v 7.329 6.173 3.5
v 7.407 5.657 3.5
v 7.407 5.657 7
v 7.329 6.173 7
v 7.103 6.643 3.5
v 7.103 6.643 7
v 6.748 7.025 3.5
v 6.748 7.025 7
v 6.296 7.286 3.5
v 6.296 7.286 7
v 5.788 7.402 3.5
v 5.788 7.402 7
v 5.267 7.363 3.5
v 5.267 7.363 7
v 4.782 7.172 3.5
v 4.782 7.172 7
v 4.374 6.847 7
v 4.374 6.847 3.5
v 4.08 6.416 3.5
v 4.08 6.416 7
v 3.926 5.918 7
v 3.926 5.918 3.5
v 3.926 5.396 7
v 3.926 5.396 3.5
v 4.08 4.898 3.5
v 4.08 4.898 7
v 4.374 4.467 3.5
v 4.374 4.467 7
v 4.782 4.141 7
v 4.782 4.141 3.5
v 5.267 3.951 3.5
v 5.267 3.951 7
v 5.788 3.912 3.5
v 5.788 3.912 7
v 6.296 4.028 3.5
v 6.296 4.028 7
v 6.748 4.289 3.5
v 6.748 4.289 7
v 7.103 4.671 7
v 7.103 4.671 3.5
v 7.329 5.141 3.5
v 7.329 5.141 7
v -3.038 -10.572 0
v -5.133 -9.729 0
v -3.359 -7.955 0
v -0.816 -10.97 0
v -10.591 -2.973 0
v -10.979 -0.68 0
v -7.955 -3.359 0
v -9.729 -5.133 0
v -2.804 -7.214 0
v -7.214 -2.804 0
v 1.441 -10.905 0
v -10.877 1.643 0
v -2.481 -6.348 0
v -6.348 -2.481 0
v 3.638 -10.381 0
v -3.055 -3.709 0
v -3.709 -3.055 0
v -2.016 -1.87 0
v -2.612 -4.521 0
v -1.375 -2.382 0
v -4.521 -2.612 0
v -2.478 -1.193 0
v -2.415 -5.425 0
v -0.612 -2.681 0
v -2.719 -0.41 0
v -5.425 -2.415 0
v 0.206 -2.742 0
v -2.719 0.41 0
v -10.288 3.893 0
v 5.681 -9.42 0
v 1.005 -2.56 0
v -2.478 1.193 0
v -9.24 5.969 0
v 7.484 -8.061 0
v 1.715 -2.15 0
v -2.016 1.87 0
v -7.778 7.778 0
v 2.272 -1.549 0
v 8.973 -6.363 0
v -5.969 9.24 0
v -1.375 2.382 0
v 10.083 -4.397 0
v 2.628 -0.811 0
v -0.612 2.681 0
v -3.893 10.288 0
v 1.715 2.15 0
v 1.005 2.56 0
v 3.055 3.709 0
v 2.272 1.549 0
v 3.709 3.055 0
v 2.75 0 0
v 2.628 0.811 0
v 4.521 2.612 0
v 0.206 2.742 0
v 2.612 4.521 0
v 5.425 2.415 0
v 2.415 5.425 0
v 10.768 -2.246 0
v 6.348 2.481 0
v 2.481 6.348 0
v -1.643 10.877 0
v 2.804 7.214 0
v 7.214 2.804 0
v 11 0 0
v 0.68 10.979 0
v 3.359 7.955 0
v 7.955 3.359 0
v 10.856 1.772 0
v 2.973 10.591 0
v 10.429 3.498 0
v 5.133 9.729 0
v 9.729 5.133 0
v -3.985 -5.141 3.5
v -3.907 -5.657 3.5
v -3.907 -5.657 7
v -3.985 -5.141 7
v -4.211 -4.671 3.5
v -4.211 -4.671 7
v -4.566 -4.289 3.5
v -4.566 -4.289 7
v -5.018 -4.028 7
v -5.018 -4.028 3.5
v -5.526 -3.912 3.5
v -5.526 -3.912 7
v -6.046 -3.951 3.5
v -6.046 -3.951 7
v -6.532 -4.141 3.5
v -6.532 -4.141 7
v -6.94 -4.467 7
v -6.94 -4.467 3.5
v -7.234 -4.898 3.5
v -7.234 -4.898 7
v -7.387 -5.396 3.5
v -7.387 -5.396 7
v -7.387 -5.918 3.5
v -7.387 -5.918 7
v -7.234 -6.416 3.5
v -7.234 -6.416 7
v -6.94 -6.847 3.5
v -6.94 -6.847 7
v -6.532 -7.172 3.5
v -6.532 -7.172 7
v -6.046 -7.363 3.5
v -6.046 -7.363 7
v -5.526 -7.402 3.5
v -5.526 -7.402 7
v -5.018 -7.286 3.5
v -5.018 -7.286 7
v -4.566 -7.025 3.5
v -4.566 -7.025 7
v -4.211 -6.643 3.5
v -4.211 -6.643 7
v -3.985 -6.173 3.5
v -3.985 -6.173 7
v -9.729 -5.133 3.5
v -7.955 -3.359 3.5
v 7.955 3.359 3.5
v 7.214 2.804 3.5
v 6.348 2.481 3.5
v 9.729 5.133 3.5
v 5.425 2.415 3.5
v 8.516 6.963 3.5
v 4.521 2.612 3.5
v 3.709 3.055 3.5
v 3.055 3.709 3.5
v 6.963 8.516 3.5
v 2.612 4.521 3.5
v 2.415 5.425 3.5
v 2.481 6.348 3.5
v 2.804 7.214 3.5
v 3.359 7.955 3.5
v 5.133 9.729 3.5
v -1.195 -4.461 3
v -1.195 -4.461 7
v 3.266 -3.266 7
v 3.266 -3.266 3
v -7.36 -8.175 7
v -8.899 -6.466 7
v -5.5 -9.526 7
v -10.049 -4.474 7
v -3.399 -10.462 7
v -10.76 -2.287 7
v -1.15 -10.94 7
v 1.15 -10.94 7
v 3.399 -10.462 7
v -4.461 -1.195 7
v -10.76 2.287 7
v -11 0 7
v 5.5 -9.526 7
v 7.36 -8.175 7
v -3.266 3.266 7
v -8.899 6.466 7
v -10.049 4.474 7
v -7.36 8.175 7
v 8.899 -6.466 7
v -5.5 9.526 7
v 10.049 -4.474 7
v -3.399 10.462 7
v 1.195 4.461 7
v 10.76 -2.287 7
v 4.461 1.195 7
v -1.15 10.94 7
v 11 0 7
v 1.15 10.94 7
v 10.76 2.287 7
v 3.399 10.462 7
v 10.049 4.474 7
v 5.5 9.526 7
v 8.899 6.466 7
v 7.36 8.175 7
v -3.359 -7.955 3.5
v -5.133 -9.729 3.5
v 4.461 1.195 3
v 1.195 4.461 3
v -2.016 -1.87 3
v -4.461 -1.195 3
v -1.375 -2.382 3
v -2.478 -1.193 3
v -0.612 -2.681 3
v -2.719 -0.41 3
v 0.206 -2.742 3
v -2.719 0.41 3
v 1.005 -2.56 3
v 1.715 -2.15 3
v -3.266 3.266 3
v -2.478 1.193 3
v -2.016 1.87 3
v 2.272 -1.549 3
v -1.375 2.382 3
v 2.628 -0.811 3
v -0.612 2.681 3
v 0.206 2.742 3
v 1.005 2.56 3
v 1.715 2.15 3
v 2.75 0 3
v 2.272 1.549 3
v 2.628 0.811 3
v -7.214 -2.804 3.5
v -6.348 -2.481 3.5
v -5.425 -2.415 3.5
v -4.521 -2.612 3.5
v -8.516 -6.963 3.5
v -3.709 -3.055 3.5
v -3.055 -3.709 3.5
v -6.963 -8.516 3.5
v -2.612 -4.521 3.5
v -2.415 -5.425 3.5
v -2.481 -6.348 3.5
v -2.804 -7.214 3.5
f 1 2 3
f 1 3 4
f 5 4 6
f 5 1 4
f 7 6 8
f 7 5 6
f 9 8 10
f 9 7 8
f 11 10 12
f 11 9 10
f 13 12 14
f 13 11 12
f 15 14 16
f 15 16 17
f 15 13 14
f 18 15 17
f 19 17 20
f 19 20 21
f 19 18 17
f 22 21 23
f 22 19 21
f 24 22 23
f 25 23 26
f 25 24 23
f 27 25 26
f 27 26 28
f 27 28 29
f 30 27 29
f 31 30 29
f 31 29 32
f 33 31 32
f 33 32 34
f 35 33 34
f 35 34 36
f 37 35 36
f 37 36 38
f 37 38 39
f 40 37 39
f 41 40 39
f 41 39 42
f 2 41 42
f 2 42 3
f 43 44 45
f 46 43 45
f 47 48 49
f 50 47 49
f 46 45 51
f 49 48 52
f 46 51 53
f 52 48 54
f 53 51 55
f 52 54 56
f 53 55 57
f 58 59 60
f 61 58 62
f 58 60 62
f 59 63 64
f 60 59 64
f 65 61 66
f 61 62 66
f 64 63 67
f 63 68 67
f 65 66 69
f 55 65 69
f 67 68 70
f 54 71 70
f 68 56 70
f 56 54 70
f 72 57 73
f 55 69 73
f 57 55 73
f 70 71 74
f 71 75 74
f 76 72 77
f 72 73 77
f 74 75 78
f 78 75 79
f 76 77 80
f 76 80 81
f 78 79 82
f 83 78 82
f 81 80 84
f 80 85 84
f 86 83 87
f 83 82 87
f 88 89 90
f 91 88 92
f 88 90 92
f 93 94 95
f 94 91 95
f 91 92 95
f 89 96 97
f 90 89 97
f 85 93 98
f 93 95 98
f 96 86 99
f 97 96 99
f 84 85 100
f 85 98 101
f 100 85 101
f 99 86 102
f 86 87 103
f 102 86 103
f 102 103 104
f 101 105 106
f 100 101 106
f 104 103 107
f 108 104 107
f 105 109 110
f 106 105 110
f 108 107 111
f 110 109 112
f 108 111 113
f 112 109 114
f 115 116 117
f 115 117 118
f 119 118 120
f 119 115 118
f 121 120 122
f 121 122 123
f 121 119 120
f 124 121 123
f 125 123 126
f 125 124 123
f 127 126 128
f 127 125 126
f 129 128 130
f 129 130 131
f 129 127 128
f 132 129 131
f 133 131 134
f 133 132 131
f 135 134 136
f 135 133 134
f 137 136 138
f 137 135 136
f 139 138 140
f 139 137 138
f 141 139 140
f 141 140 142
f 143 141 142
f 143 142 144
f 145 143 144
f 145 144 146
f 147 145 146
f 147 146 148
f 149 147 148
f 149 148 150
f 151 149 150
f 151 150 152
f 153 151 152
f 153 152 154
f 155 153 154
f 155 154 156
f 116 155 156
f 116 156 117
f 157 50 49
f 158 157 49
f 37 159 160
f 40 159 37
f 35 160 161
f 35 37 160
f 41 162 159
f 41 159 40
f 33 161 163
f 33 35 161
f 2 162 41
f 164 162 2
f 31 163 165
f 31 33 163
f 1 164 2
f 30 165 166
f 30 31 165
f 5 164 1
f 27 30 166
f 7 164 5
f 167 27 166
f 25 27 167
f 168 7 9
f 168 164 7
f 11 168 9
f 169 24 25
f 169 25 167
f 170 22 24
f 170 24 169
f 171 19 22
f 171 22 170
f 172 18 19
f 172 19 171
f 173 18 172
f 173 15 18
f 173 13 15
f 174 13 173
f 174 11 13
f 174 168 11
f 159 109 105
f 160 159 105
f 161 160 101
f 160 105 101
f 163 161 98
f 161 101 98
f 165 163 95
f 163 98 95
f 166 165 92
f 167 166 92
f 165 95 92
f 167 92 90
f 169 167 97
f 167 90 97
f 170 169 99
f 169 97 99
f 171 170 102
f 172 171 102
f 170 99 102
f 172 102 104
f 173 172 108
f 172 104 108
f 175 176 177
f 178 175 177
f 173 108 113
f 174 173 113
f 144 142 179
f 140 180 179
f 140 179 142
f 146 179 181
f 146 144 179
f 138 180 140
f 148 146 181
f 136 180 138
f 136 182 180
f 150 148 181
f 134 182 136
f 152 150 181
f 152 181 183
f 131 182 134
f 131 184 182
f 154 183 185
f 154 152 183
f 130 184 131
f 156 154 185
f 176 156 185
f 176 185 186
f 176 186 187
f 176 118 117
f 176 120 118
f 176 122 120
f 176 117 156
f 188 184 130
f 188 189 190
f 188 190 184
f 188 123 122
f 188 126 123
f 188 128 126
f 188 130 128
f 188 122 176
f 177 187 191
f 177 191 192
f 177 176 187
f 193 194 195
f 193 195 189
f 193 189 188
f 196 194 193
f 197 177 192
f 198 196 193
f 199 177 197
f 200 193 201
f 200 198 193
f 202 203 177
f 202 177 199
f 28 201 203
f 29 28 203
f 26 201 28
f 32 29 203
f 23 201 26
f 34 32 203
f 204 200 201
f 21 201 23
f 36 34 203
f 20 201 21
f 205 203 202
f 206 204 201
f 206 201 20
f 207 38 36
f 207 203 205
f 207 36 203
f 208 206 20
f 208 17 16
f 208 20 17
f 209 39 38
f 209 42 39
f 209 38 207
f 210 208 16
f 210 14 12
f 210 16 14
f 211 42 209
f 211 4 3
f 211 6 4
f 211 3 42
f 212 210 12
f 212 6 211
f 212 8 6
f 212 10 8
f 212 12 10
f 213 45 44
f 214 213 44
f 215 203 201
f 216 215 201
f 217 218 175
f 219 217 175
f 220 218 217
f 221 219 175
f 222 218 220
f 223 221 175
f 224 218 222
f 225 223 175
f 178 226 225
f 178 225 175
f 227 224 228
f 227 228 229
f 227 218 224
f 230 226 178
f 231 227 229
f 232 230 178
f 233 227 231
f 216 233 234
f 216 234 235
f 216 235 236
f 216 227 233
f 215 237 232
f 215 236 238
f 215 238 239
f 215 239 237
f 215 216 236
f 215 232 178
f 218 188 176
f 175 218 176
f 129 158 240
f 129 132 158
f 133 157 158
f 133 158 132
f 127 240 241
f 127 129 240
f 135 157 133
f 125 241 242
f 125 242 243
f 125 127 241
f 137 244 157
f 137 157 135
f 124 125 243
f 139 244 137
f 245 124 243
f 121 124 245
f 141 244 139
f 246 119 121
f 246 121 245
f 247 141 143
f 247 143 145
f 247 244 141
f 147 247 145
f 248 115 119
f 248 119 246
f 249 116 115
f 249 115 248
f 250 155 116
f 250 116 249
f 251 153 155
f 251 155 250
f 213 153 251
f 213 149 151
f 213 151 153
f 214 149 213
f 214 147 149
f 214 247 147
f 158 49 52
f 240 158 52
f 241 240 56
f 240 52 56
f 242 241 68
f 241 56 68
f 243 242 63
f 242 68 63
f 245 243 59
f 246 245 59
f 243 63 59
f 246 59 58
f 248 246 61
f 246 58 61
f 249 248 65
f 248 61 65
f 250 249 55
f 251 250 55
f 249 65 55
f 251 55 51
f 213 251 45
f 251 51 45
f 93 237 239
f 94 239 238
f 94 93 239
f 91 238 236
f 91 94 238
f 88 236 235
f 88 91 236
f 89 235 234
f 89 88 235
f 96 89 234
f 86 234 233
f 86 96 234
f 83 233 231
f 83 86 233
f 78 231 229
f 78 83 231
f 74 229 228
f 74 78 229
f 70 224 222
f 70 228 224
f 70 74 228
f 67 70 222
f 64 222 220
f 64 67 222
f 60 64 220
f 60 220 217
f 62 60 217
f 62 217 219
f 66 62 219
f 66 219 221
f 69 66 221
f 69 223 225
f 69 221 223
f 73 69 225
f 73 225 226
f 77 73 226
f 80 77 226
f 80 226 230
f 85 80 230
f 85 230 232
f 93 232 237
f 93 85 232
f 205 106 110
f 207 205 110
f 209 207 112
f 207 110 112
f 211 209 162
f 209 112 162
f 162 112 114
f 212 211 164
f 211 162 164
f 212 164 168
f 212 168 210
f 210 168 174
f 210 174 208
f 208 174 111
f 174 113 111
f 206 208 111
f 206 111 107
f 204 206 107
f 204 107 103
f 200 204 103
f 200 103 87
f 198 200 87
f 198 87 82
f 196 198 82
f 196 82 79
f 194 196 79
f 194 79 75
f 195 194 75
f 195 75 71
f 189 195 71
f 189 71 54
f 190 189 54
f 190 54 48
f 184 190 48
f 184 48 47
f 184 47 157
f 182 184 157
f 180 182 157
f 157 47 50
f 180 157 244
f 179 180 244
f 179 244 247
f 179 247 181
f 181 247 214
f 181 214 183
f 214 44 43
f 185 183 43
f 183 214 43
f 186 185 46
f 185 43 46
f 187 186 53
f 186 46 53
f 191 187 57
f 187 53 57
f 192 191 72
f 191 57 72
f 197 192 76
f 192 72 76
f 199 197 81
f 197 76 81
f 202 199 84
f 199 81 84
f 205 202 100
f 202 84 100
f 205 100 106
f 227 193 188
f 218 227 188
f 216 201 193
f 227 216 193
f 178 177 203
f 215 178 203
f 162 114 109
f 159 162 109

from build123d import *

# Parameters (mm, degrees)
ESBO_O1_R                = 11
ESBO_O1_R_2              = 1.75
ESBO_O1_R_3              = 2.75
RESSALTO_EXTRUS_O1_DEPTH = 7
CORTE_EXTRUS_O5_DEPTH    = 4
ESBO_O12_R               = 1.75
CORTE_EXTRUS_O6_DEPTH    = 3.5
PADR_OCIRCULAR1_COUNT    = 2


with BuildPart() as part:
    # Esboço1 → Ressalto-extrusão1 (new body)
    with BuildSketch(Plane.XY):
        Circle(ESBO_O1_R)
        with Locations((5.656854249, 5.656854249)):
            Circle(ESBO_O1_R_2, mode=Mode.SUBTRACT)
        with Locations((-5.656854249, -5.656854249)):
            Circle(ESBO_O1_R_2, mode=Mode.SUBTRACT)
        Circle(ESBO_O1_R_3, mode=Mode.SUBTRACT)
    extrude(amount=RESSALTO_EXTRUS_O1_DEPTH)

    # Esboço10 → Corte-extrusão5 (cut)
    with BuildSketch(Plane.XY.offset(7)):
        Polygon((-1.195433963, -4.461420287), (3.265986324, -3.265986324), (4.461420287, 1.195433963), (1.195433963, 4.461420287), (-3.265986324, 3.265986324), (-4.461420287, -1.195433963), align=None)
    extrude(amount=-CORTE_EXTRUS_O5_DEPTH, mode=Mode.SUBTRACT)

    # Esboço12 → Corte-extrusão6 (cut)
    with BuildSketch(Plane(origin=(0, 0, 0), x_dir=(-1, 0, 0), z_dir=(0, 0, -1))):
        with BuildLine():
            ThreePointArc((-7.954951288, 3.358757211), (-3.358757211, 3.358757211), (-3.358757211, 7.954951288))
            Line((-3.358757211, 7.954951288), (-5.132834935, 9.729029013))
            ThreePointArc((-5.132834935, 9.729029013), (-7.778174593, 7.778174593), (-9.729029013, 5.132834935))
            Line((-9.729029013, 5.132834935), (-7.954951288, 3.358757211))
        make_face()
        with Locations(Location((-5.656854249, 5.656854249, 0), (0, 0, 180))):
            Circle(ESBO_O12_R, mode=Mode.SUBTRACT)
    corte_extrus_o6 = extrude(amount=-CORTE_EXTRUS_O6_DEPTH, mode=Mode.SUBTRACT)

    # PadrãoCircular1: Corte-extrusão6 ×2 about axis
    padr_ocircular1_axis = Axis((0, 0, 0), (0, 0, 1))
    for i in range(1, PADR_OCIRCULAR1_COUNT):
        add(corte_extrus_o6.rotate(padr_ocircular1_axis, i * 360 / PADR_OCIRCULAR1_COUNT), mode=Mode.SUBTRACT)


solid = part.part
